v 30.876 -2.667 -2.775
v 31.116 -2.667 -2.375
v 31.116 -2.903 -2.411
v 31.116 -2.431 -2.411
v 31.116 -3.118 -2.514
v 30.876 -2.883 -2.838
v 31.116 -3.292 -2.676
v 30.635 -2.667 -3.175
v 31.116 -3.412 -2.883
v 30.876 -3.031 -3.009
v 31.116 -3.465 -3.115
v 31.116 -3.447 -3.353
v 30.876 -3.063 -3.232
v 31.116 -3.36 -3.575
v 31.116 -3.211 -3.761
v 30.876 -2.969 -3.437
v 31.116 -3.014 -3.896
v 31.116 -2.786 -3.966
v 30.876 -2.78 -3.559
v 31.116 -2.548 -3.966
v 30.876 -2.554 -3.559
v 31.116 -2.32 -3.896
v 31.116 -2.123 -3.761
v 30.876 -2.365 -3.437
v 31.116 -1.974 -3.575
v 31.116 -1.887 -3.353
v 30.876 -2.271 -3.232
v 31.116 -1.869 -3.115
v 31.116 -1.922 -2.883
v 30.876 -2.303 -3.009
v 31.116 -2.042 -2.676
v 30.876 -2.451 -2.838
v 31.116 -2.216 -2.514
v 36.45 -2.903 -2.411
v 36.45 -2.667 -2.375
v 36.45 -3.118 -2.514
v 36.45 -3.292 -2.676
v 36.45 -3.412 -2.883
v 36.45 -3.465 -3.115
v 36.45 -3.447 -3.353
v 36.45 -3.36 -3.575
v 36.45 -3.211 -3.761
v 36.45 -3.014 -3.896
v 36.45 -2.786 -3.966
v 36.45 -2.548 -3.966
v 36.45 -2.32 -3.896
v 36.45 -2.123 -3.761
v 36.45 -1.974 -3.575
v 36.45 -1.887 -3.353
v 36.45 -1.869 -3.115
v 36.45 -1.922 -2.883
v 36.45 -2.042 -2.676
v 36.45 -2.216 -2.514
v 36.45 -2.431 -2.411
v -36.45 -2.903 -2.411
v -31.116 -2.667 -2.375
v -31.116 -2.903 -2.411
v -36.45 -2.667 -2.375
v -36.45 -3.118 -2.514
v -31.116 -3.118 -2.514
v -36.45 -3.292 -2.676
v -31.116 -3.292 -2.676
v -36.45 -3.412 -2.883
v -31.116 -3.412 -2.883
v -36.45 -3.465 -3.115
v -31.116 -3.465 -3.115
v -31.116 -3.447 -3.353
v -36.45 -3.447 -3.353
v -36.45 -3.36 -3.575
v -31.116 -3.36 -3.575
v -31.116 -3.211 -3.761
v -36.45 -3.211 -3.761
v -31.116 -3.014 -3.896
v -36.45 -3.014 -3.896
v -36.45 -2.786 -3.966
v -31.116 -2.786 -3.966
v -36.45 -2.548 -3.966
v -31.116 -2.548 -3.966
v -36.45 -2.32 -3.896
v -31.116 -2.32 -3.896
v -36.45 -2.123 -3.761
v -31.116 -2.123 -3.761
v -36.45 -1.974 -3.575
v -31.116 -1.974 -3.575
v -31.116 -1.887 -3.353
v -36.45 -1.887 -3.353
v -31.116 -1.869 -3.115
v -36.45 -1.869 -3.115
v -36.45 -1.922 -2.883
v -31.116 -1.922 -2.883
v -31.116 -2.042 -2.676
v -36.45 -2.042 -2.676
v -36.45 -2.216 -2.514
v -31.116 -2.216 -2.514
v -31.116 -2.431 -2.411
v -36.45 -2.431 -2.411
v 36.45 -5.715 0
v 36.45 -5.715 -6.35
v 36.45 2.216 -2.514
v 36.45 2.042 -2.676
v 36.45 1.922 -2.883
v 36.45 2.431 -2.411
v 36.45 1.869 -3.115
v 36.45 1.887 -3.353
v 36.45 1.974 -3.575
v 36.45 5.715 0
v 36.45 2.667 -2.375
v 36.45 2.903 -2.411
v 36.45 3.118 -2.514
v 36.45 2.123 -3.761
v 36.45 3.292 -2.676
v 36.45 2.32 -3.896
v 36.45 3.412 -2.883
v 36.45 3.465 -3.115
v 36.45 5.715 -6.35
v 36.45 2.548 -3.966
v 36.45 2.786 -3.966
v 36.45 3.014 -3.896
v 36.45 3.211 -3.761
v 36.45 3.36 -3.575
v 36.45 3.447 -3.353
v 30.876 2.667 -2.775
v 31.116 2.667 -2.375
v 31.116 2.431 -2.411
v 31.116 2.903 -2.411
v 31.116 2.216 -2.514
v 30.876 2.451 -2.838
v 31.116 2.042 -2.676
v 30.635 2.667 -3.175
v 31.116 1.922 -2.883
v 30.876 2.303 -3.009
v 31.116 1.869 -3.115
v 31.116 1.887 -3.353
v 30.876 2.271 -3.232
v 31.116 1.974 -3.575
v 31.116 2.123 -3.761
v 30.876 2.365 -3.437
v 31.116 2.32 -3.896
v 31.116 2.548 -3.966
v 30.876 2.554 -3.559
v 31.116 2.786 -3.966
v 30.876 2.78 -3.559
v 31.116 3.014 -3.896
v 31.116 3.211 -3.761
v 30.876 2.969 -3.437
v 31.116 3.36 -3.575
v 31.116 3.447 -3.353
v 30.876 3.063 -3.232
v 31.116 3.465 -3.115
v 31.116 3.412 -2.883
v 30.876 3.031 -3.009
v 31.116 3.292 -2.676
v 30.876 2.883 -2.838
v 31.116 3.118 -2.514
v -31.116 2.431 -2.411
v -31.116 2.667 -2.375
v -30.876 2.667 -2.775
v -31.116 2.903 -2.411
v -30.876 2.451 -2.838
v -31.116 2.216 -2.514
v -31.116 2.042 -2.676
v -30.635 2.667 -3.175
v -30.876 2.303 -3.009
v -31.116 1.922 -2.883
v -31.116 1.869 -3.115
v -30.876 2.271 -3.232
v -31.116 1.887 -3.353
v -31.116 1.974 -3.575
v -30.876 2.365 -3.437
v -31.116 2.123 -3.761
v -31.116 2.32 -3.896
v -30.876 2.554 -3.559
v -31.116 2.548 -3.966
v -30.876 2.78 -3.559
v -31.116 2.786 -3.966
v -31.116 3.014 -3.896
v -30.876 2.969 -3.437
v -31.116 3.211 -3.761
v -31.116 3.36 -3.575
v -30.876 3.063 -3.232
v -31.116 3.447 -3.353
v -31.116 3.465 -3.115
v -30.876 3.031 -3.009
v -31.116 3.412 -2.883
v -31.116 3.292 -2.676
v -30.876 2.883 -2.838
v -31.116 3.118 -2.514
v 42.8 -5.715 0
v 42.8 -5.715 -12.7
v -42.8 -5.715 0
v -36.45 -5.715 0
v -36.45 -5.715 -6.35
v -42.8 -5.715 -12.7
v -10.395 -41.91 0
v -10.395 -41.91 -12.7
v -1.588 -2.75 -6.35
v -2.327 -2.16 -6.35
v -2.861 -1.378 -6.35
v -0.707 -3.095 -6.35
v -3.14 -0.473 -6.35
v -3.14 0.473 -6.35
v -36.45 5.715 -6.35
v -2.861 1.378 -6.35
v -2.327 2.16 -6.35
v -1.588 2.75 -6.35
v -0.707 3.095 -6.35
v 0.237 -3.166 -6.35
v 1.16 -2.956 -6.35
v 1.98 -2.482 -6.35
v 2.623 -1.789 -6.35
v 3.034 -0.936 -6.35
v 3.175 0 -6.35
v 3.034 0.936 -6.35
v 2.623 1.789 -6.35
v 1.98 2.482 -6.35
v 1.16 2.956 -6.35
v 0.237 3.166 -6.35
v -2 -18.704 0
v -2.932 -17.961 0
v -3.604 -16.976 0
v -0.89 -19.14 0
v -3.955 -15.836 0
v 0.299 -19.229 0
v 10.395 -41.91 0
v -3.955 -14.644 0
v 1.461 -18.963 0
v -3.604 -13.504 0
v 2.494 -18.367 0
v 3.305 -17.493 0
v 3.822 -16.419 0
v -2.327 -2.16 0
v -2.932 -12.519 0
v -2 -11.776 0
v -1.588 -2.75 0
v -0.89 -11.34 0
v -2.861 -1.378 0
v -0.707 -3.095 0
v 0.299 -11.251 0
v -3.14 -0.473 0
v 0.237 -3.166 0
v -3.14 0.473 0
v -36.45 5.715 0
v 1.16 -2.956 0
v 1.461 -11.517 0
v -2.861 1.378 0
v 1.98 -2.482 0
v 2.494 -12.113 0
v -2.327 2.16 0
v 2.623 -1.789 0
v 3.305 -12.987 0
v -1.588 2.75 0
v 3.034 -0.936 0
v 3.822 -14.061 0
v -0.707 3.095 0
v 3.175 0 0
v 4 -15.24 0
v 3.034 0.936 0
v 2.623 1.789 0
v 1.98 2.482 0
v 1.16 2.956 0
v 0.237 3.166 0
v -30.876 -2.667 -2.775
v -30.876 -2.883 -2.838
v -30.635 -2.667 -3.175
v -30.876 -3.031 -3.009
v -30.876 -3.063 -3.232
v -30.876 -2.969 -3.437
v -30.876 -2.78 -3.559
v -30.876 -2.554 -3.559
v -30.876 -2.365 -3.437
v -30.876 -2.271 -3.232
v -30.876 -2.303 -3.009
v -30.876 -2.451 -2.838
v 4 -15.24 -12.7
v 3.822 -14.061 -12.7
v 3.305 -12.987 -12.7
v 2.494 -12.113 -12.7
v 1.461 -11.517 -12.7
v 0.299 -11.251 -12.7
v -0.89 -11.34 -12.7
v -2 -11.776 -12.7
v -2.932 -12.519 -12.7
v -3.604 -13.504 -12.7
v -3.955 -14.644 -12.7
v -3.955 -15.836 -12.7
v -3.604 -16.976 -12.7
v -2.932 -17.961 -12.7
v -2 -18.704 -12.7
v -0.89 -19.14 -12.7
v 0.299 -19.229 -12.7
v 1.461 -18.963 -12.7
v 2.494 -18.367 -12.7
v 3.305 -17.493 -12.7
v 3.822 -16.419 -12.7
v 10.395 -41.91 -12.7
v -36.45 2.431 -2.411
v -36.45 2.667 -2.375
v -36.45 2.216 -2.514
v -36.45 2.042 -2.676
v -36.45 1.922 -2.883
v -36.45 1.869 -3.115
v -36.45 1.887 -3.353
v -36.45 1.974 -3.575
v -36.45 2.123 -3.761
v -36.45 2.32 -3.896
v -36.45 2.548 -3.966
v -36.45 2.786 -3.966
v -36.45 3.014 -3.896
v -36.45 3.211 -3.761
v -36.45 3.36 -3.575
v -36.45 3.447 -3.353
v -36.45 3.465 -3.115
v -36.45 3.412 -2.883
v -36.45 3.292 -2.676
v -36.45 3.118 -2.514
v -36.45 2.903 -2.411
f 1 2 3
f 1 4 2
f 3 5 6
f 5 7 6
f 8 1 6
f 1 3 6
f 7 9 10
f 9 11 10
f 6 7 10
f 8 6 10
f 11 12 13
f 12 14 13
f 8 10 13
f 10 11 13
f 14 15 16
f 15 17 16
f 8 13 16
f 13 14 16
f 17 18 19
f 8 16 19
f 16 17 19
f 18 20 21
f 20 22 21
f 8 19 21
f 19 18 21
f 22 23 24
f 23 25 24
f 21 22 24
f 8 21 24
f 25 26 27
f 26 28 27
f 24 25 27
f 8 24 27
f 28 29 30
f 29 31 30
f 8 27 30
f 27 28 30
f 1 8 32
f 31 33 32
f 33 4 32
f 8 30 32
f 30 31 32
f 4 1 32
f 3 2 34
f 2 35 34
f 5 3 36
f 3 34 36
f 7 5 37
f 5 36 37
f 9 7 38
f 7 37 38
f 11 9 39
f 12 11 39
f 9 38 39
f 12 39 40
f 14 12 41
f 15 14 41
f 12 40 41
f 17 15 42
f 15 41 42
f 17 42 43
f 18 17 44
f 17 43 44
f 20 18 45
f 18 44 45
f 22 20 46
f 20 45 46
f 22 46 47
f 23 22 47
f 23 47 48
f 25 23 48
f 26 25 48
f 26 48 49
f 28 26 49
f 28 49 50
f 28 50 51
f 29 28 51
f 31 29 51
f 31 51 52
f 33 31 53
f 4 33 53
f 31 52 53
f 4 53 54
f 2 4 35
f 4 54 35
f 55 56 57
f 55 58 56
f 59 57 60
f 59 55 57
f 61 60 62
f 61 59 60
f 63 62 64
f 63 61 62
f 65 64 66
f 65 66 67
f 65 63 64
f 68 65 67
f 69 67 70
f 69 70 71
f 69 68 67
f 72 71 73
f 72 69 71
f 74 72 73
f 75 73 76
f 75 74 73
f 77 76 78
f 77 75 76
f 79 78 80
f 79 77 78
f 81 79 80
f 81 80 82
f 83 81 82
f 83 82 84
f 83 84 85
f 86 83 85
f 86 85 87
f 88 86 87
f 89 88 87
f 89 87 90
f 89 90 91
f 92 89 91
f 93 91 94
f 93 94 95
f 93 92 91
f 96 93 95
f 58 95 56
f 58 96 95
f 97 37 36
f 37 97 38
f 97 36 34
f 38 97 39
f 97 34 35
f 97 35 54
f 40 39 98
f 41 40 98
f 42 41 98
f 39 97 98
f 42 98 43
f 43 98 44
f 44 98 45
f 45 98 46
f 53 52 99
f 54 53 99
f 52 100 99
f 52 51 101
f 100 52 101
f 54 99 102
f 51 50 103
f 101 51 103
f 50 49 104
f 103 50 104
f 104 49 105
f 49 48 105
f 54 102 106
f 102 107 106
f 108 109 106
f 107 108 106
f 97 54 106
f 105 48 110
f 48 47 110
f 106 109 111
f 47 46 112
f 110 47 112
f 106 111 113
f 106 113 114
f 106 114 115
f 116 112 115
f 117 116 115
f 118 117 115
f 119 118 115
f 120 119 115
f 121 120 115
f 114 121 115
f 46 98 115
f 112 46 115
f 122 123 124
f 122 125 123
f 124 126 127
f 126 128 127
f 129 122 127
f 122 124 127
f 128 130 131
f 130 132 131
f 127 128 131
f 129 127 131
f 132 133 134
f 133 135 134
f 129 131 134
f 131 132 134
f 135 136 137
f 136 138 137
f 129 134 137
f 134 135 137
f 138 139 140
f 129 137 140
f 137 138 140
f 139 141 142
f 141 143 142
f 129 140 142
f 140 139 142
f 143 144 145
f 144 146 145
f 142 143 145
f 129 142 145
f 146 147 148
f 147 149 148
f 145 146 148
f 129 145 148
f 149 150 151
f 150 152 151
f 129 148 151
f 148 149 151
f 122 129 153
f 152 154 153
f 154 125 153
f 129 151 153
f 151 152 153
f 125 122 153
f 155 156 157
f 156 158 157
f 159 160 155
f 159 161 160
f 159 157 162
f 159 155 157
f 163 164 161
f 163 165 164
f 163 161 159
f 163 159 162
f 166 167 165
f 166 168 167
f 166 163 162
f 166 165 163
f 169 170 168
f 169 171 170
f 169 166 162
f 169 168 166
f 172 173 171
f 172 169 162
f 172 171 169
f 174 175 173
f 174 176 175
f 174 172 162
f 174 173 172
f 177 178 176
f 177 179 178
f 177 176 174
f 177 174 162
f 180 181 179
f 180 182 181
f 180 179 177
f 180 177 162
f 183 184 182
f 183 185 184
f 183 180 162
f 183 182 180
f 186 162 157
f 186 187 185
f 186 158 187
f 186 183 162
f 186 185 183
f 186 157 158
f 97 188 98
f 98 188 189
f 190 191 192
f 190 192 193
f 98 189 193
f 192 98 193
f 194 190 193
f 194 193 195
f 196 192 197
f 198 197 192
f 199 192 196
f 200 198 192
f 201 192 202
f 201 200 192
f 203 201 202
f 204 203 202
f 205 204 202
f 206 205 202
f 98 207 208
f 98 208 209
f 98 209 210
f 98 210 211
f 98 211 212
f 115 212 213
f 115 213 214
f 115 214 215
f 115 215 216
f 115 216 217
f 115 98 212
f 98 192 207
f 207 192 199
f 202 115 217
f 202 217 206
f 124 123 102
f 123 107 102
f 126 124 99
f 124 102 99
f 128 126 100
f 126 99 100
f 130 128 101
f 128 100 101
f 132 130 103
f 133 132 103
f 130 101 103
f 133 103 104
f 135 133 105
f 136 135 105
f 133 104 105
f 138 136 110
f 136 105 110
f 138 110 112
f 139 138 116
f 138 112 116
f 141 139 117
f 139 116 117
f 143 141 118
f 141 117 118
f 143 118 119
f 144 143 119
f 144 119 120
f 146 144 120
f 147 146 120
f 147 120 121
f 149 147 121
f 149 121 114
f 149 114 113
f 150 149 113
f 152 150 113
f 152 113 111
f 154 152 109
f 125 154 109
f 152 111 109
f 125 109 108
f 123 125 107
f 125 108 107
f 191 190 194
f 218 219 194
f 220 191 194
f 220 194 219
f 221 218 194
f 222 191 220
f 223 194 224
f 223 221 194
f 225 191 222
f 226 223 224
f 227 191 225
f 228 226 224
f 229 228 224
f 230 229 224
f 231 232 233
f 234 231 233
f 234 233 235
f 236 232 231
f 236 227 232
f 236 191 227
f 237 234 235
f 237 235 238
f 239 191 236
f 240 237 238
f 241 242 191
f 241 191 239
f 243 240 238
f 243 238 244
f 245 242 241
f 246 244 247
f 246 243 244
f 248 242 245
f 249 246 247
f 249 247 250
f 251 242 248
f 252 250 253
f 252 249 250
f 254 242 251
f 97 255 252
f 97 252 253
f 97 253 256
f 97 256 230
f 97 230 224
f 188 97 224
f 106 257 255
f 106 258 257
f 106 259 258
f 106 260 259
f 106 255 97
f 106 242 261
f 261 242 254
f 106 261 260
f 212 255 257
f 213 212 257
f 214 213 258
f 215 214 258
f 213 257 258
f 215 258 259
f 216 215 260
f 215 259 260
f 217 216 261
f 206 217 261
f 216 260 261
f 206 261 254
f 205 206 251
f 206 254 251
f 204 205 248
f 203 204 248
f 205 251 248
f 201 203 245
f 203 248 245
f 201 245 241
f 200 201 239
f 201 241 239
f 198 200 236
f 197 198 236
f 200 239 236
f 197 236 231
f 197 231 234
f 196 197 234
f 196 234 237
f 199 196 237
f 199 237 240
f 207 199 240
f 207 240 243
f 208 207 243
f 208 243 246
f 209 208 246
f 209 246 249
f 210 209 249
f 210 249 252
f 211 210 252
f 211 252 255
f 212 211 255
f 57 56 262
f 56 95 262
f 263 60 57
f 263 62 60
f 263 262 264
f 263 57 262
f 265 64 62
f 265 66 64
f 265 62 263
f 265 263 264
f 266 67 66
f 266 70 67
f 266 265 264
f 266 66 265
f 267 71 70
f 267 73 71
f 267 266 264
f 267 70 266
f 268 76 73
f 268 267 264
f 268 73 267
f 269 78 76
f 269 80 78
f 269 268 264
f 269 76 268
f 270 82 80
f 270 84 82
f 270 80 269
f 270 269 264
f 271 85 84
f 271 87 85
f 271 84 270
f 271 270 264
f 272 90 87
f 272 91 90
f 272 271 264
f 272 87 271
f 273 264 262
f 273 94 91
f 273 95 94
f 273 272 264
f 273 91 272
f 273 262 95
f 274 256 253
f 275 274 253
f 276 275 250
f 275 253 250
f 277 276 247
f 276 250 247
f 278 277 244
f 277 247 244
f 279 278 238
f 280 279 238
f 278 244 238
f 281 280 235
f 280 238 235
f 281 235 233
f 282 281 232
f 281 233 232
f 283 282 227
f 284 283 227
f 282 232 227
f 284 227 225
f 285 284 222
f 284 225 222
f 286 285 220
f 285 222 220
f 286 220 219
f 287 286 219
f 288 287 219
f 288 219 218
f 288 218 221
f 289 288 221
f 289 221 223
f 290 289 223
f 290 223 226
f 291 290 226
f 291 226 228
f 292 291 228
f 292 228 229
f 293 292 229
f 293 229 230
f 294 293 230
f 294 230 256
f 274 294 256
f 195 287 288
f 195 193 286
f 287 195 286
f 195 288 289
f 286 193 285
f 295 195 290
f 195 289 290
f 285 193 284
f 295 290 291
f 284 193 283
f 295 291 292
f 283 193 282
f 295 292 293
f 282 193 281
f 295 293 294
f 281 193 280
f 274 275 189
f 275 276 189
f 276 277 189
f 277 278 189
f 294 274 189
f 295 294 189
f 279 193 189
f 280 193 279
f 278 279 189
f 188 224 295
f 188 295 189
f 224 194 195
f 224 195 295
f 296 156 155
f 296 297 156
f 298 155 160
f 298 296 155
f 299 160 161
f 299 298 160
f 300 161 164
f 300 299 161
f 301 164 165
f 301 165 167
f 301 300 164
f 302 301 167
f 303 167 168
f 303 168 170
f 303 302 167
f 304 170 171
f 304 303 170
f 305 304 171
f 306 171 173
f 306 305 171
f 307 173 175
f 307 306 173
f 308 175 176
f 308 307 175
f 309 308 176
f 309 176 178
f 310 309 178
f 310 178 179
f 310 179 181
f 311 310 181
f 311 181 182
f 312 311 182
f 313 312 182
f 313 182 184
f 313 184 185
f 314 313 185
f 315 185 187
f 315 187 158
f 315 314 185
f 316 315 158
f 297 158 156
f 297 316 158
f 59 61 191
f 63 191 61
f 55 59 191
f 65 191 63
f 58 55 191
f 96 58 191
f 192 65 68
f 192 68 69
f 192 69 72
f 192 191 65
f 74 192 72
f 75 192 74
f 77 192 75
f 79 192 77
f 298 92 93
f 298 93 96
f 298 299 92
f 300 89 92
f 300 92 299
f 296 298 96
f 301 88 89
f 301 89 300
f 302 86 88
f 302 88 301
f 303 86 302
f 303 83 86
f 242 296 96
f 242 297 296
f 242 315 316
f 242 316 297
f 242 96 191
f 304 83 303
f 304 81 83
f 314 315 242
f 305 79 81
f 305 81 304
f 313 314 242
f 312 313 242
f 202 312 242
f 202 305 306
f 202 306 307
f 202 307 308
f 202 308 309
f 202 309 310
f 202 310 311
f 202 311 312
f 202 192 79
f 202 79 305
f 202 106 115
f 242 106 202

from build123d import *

# Parameters (mm, degrees)
BOSS_EXTRUDE1_DEPTH            = 12.7
SKETCH2_R                      = 3.175
CUT_EXTRUDE1_DEPTH             = 62.233889922
SKETCH3_W                      = 6.35
SKETCH3_H                      = 11.43
CUT_EXTRUDE2_DEPTH             = 97.151665612
SKETCH4_R                      = 4
CUT_EXTRUDE3_DEPTH             = 62.233889922
SKETCH5_R                      = 1
CUT_EXTRUDE4_DEPTH             = 62.233889922
SKETCH6_W                      = 6.35
SKETCH6_H                      = 11.43
CUT_EXTRUDE5_DEPTH             = 61.238042589
M2X0_4_TAPPED_HOLE1_AT_2_COUNT = 2
M2X0_4_TAPPED_HOLE1_AT_2_PITCH = 5.334


with BuildPart() as part:
    # Sketch1 → Boss-Extrude1 (new body)
    with BuildSketch(Plane.XY):
        Polygon((-42.800130549, -5.715), (-10.39539802, -41.91), (10.39539802, -41.91), (42.800130549, -5.715), (42.800130549, 5.715), (-42.800130549, 5.715), align=None)
    extrude(amount=-BOSS_EXTRUDE1_DEPTH)

    # Sketch2 → Cut-Extrude1 (cut, through all)
    with BuildSketch(Plane.XY):
        Circle(SKETCH2_R)
    extrude(amount=-CUT_EXTRUDE1_DEPTH, mode=Mode.SUBTRACT)

    # Sketch3 → Cut-Extrude2 (cut, through all)
    with BuildSketch(Plane(origin=(42.800130549, 0, 0), x_dir=(0, 0, -1), z_dir=(1, 0, 0))):
        with Locations((9.525, 0)):
            Rectangle(SKETCH3_W, SKETCH3_H)
    extrude(amount=-CUT_EXTRUDE2_DEPTH, mode=Mode.SUBTRACT)

    # Sketch4 → Cut-Extrude3 (cut, through all)
    with BuildSketch(Plane.XY):
        with Locations((0, -15.24)):
            Circle(SKETCH4_R)
    extrude(amount=-CUT_EXTRUDE3_DEPTH, mode=Mode.SUBTRACT)

    # Sketch5 → Cut-Extrude4 (cut, through all)
    with BuildSketch(Plane.XY):
        with Locations((39.625130549, 3.175)):
            Circle(SKETCH5_R)
        with Locations((39.625130549, -3.175)):
            Circle(SKETCH5_R)
    cut_extrude4 = extrude(amount=-CUT_EXTRUDE4_DEPTH, mode=Mode.SUBTRACT)

    # Mirror1: Cut-Extrude4 across plane
    add(cut_extrude4.mirror(Plane(origin=(0, 0, 0), x_dir=(0, 0, 1), z_dir=(1, 0, 0))), mode=Mode.SUBTRACT)

    # Sketch6 → Cut-Extrude5 (cut, through all)
    with BuildSketch(Plane(origin=(0, 0, -6.35), x_dir=(-1, 0, 0), z_dir=(0, 0, -1))):
        with Locations((-39.625130549, 0)):
            Rectangle(SKETCH6_W, SKETCH6_H)
        with Locations((39.625130549, 0)):
            Rectangle(SKETCH6_W, SKETCH6_H)
    extrude(amount=-CUT_EXTRUDE5_DEPTH, mode=Mode.SUBTRACT)

    # Sketch8 → M2x0.4 Tapped Hole1 (revolve, cut)
    with BuildSketch(Plane(origin=(-36.450130549, 2.667, -3.175), x_dir=(0, 0, 1), z_dir=(0, 1, 0))):
        Polygon((0, 0), (0, 5.814688495), (0.8, 5.334), (0.8, 0), align=None)
    m2x0_4_tapped_hole1 = revolve(axis=Axis((-42.800130549, 2.667, -3.175), (1, 0, 0)), mode=Mode.SUBTRACT)

    # M2x0.4 Tapped Hole1 at 2: M2x0.4 Tapped Hole1 ×2
    with Locations(*[(0, -i * M2X0_4_TAPPED_HOLE1_AT_2_PITCH, 0) for i in range(1, M2X0_4_TAPPED_HOLE1_AT_2_COUNT)]):
        add(m2x0_4_tapped_hole1, mode=Mode.SUBTRACT)

    # Mirror2: M2x0.4 Tapped Hole1 across plane
    add(m2x0_4_tapped_hole1.mirror(Plane(origin=(0, 0, 0), x_dir=(0, 0, 1), z_dir=(1, 0, 0))), mode=Mode.SUBTRACT)

    # Mirror2 copy 1 sketch → Mirror2 copy 1 (revolve, cut)
    with BuildSketch(Plane(origin=(36.450130549, -2.667, -3.175), x_dir=(0, 0, 1), z_dir=(0, 1, 0))):
        Polygon((0, 0), (0, -5.814688495), (0.8, -5.334), (0.8, 0), align=None)
    revolve(axis=Axis((42.800130549, -2.667, -3.175), (1, 0, 0)), mode=Mode.SUBTRACT)


solid = part.part
